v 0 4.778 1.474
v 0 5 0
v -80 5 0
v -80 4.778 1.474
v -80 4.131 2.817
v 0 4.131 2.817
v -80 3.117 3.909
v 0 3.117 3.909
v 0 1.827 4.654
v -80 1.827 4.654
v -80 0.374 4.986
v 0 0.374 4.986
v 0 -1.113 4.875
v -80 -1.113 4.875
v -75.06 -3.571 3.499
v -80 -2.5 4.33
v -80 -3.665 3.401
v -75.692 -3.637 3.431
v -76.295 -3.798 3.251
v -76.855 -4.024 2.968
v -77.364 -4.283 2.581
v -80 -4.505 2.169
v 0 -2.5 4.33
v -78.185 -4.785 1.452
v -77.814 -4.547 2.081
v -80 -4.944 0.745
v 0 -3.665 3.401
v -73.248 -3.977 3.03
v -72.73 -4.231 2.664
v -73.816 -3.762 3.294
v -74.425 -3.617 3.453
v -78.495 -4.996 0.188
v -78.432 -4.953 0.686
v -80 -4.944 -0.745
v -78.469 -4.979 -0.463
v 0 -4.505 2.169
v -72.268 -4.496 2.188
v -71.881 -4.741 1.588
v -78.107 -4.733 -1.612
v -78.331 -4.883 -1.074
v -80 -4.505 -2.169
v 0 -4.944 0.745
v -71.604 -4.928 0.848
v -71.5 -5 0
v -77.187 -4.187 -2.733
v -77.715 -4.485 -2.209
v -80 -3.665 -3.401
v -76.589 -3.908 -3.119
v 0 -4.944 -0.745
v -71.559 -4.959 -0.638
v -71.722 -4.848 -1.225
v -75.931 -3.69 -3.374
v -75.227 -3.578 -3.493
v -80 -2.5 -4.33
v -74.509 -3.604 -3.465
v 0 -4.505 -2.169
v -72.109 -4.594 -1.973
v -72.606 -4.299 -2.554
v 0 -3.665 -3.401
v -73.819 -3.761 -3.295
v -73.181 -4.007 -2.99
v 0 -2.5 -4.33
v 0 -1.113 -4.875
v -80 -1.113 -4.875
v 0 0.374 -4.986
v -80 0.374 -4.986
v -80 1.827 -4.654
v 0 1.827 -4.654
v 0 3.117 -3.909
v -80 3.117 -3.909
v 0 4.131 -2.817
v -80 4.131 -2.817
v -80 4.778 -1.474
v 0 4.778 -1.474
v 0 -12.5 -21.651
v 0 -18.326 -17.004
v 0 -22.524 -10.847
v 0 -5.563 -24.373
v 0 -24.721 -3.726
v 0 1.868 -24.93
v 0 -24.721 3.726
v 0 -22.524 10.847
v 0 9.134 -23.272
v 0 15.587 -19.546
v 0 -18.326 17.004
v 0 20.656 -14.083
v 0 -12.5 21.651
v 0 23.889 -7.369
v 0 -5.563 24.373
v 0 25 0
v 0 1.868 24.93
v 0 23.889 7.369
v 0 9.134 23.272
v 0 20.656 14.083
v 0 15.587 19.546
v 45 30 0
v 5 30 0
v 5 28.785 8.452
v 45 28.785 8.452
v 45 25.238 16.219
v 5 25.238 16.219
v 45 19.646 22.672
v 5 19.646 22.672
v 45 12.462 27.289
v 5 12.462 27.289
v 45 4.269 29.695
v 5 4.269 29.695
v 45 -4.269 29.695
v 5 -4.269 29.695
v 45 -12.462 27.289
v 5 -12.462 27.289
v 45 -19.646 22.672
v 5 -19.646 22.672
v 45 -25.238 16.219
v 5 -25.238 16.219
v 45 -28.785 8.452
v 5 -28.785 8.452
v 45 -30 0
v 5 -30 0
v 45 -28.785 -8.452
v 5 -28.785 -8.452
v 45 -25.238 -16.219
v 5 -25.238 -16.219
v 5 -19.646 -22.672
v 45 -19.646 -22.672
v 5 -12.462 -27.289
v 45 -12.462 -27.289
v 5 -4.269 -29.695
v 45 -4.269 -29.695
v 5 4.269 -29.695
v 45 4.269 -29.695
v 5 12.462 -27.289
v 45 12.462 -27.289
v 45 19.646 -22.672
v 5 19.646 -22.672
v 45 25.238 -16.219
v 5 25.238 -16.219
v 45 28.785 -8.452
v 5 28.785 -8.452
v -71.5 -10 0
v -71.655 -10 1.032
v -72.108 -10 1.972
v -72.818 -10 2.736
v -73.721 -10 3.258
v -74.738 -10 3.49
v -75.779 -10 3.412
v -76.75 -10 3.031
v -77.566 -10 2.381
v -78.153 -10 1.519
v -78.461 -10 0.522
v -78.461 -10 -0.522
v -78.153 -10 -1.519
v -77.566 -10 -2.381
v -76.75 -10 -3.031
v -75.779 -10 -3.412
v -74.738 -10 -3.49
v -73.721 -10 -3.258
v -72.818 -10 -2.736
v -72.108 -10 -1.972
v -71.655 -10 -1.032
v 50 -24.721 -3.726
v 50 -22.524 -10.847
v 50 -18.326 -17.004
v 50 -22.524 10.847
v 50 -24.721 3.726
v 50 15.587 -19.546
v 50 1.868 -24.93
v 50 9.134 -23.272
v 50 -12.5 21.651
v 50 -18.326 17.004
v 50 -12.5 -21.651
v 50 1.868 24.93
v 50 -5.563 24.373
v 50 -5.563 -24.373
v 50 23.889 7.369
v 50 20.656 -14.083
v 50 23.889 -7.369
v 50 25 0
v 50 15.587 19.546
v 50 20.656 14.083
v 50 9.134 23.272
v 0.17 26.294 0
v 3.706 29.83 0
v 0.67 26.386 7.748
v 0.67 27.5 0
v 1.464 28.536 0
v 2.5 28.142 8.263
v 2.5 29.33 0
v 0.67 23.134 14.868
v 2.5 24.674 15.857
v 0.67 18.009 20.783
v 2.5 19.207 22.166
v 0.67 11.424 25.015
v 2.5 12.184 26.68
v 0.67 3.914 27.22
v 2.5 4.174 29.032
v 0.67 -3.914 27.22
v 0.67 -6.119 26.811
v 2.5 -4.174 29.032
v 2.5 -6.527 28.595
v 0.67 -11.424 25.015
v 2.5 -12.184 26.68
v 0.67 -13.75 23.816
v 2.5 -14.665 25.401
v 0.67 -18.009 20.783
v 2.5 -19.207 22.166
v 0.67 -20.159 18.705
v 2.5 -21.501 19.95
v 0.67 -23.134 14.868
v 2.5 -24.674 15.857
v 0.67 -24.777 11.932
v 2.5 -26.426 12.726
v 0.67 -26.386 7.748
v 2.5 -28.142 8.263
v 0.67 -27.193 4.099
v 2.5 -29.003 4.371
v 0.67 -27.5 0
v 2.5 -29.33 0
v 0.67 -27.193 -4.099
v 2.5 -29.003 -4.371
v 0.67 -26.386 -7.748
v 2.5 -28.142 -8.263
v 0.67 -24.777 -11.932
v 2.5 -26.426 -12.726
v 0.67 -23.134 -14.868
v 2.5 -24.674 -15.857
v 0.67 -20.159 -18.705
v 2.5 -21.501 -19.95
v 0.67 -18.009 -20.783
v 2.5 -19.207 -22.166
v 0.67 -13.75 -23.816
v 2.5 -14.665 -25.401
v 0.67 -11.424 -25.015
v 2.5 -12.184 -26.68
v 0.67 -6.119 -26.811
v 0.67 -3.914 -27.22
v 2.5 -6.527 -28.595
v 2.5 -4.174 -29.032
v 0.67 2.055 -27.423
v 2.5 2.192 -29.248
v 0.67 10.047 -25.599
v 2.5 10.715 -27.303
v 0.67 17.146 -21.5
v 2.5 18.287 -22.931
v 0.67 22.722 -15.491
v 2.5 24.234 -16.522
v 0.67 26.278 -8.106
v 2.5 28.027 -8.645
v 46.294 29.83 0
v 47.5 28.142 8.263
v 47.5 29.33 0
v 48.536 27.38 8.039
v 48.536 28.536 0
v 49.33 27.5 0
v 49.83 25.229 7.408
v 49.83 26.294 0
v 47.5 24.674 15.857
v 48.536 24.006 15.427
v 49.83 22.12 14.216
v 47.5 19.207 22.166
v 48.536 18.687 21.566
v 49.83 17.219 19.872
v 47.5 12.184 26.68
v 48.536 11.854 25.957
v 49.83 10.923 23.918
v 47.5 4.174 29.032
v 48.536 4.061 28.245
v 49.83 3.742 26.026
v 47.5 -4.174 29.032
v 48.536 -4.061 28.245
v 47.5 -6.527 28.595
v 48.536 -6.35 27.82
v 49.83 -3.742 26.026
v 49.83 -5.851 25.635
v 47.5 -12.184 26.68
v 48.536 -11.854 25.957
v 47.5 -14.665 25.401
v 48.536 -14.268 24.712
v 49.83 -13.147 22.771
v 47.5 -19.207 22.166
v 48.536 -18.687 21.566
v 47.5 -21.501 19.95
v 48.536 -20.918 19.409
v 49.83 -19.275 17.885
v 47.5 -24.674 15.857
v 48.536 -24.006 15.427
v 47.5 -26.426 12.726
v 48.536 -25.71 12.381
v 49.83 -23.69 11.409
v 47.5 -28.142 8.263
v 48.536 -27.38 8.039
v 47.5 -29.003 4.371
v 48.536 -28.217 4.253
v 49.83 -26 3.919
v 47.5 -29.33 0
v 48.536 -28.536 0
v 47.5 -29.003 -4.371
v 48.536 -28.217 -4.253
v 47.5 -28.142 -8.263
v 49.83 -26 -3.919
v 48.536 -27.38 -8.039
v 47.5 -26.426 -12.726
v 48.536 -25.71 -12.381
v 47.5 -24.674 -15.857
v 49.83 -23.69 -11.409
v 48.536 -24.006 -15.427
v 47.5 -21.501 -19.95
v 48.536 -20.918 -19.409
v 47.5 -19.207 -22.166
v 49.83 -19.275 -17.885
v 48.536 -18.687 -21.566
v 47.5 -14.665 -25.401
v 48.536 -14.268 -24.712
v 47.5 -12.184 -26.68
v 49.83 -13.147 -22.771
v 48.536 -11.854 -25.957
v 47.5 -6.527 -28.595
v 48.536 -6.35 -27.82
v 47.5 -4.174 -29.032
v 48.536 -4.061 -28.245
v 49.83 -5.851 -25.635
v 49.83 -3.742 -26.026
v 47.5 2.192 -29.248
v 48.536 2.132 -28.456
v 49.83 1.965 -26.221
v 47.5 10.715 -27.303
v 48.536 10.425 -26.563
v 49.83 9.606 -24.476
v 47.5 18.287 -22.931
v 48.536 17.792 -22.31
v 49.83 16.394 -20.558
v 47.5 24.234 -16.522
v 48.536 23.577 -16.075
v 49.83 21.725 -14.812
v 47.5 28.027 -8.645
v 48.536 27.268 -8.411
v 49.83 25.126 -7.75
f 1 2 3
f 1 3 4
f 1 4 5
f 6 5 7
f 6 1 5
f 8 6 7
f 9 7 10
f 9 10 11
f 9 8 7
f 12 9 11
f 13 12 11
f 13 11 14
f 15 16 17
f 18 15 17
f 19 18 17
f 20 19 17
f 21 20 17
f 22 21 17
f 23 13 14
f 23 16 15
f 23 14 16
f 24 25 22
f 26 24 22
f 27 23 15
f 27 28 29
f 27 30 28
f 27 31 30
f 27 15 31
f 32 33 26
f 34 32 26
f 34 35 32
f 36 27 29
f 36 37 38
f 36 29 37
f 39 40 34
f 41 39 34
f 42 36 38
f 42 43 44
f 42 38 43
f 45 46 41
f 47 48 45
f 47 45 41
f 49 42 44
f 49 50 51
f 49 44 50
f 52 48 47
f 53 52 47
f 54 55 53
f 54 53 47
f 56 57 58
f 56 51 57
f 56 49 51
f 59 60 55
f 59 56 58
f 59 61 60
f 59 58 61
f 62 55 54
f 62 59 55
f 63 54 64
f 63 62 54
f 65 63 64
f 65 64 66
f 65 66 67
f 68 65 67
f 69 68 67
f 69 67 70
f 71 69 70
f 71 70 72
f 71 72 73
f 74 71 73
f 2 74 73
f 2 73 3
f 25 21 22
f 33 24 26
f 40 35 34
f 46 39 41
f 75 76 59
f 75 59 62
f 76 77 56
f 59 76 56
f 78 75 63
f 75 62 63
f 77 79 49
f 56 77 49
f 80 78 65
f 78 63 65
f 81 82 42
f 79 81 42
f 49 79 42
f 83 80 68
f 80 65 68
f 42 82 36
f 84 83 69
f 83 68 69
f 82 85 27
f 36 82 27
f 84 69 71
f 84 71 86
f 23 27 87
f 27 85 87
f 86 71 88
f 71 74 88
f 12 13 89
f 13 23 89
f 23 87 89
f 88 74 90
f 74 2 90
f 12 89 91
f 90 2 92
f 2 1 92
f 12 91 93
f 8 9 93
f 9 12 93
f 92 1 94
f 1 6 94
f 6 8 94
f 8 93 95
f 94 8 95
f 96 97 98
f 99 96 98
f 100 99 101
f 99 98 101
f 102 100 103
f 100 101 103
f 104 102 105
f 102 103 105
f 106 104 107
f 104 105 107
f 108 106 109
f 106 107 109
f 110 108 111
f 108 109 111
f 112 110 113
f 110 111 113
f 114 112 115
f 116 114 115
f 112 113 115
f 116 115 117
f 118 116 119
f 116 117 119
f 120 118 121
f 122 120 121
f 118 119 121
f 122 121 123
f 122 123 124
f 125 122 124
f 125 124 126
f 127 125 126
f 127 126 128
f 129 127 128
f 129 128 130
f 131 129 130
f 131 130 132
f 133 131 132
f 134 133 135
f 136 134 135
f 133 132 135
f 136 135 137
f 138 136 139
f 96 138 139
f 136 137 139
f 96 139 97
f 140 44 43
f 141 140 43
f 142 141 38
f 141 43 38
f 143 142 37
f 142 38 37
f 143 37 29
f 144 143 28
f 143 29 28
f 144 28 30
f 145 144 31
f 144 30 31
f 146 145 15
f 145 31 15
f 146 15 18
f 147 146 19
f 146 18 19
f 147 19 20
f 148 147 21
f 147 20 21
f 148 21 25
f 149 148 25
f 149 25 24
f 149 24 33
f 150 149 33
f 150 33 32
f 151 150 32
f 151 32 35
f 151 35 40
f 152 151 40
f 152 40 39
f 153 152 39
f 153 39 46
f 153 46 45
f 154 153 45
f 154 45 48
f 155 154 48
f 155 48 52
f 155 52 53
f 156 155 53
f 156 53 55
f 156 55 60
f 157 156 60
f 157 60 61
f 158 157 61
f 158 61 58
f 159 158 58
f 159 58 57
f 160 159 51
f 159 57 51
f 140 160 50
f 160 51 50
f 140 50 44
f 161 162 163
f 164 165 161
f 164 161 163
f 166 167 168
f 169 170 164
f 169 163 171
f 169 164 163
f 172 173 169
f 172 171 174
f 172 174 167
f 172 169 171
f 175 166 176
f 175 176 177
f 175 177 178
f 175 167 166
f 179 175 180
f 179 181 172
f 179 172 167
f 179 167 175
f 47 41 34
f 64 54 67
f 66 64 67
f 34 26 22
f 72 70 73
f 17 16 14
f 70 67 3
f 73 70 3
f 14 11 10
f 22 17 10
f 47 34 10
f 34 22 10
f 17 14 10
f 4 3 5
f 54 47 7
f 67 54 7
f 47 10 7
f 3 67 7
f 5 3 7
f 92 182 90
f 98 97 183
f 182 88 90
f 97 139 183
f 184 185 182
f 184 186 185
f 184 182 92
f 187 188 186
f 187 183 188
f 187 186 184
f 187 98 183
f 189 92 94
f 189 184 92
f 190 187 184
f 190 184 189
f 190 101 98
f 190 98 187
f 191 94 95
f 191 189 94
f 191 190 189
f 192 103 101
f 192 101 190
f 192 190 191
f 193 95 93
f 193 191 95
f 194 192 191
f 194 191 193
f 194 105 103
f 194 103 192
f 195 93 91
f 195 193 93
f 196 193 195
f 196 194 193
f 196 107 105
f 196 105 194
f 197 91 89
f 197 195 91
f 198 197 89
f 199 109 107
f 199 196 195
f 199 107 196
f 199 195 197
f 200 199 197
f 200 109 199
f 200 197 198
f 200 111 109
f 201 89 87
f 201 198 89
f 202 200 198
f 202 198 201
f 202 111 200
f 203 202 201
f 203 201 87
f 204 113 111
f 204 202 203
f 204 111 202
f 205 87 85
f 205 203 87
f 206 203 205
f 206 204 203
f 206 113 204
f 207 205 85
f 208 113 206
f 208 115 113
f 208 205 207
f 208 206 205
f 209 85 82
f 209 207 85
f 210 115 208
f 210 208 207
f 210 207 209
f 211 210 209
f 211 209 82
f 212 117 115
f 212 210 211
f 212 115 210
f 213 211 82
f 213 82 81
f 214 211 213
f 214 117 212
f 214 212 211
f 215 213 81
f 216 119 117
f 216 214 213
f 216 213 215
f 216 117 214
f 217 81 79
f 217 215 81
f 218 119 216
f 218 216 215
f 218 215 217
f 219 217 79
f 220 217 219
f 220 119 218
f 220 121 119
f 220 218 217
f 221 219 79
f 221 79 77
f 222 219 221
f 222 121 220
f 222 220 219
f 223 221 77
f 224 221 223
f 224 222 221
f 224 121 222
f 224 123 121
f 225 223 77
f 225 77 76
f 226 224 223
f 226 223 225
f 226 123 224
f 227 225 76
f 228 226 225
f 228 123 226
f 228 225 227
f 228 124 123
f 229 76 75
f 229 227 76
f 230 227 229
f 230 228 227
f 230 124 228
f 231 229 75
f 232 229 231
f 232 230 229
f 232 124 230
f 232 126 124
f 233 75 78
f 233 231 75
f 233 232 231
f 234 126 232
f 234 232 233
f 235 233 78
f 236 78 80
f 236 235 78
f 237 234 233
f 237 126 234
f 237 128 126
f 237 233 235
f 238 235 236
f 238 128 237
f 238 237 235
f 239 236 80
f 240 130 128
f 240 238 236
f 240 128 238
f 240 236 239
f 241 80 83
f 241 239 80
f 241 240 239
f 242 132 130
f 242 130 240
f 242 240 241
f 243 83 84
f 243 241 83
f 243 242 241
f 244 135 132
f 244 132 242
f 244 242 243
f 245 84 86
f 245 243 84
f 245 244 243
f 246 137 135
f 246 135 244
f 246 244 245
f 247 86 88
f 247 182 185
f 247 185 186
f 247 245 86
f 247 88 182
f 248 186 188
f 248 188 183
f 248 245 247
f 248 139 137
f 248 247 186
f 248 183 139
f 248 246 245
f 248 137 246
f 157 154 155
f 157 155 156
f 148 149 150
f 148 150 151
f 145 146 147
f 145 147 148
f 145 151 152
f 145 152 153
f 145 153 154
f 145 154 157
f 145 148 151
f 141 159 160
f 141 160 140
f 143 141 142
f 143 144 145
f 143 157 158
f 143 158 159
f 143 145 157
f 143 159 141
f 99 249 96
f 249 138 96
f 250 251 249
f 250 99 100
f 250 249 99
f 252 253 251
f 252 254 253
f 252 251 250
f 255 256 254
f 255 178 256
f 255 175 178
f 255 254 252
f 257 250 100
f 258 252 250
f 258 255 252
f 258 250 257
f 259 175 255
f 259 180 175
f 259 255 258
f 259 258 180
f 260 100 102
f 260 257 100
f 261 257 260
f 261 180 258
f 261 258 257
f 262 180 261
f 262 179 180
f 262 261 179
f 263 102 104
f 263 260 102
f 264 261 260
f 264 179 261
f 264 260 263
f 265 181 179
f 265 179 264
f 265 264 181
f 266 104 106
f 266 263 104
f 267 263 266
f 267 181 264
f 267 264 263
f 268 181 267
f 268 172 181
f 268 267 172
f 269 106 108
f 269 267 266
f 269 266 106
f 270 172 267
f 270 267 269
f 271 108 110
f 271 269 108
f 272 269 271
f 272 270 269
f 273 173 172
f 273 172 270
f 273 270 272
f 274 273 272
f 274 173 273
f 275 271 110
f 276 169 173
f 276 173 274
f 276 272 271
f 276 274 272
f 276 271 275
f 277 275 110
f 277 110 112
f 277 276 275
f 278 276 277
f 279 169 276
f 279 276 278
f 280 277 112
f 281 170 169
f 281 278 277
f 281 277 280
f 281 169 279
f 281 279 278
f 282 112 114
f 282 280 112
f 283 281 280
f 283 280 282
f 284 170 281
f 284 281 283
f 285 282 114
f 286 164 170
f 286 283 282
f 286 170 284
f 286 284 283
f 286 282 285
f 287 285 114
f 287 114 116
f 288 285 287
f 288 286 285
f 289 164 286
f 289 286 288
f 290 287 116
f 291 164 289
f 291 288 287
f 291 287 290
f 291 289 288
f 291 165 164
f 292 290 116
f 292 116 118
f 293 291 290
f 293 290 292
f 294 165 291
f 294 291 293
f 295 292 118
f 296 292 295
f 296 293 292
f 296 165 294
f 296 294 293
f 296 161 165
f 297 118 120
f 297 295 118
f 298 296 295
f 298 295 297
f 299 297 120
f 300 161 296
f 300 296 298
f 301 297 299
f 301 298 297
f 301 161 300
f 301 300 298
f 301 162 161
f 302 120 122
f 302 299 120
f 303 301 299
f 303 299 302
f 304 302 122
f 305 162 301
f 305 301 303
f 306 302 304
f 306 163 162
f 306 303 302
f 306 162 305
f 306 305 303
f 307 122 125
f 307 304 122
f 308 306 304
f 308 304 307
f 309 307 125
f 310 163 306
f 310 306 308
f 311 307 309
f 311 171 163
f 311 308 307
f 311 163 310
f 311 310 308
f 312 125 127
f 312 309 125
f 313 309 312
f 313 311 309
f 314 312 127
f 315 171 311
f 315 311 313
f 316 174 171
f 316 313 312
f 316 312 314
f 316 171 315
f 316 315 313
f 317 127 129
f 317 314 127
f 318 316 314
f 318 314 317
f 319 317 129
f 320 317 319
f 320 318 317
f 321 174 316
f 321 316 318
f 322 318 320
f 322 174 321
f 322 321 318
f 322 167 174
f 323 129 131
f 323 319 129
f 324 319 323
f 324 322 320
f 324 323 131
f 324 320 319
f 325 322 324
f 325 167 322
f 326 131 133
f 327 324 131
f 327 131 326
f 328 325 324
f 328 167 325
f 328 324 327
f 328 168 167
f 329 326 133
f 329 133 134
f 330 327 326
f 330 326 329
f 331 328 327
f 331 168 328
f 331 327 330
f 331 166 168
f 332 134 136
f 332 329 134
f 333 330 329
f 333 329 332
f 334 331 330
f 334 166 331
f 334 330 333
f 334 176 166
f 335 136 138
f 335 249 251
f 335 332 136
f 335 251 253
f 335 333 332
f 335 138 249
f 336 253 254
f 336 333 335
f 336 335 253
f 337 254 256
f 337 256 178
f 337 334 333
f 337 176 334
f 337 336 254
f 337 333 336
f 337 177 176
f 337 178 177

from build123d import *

# Parameters (mm, degrees)
F0_R     = 30
F1_DEPTH = 50
F2_R     = 5
F3_DEPTH = 80
F4_R     = 3.5
F5_DEPTH = 10
F6_R     = 5


with BuildPart() as f1:
    # F0 (on Right) → F1 (new body)
    with BuildSketch(Plane.YZ):
        Circle(F0_R)
    extrude(amount=F1_DEPTH)

    # F2 (on Right) → F3 (join)
    with BuildSketch(Plane.YZ):
        Circle(F2_R)
    extrude(amount=-F3_DEPTH)

    # F4 (on Front) → F5 (join)
    with BuildSketch(Plane.XZ):
        with Locations((-75, 0)):
            Circle(F4_R)
    extrude(amount=F5_DEPTH)

    # F6
    f6_edges = [f1.edges().sort_by_distance(p)[0] for p in [
        (50, -30, 0),
        (0, -30, 0),
    ]]
    fillet(f6_edges, radius=F6_R)


solid = f1.part
